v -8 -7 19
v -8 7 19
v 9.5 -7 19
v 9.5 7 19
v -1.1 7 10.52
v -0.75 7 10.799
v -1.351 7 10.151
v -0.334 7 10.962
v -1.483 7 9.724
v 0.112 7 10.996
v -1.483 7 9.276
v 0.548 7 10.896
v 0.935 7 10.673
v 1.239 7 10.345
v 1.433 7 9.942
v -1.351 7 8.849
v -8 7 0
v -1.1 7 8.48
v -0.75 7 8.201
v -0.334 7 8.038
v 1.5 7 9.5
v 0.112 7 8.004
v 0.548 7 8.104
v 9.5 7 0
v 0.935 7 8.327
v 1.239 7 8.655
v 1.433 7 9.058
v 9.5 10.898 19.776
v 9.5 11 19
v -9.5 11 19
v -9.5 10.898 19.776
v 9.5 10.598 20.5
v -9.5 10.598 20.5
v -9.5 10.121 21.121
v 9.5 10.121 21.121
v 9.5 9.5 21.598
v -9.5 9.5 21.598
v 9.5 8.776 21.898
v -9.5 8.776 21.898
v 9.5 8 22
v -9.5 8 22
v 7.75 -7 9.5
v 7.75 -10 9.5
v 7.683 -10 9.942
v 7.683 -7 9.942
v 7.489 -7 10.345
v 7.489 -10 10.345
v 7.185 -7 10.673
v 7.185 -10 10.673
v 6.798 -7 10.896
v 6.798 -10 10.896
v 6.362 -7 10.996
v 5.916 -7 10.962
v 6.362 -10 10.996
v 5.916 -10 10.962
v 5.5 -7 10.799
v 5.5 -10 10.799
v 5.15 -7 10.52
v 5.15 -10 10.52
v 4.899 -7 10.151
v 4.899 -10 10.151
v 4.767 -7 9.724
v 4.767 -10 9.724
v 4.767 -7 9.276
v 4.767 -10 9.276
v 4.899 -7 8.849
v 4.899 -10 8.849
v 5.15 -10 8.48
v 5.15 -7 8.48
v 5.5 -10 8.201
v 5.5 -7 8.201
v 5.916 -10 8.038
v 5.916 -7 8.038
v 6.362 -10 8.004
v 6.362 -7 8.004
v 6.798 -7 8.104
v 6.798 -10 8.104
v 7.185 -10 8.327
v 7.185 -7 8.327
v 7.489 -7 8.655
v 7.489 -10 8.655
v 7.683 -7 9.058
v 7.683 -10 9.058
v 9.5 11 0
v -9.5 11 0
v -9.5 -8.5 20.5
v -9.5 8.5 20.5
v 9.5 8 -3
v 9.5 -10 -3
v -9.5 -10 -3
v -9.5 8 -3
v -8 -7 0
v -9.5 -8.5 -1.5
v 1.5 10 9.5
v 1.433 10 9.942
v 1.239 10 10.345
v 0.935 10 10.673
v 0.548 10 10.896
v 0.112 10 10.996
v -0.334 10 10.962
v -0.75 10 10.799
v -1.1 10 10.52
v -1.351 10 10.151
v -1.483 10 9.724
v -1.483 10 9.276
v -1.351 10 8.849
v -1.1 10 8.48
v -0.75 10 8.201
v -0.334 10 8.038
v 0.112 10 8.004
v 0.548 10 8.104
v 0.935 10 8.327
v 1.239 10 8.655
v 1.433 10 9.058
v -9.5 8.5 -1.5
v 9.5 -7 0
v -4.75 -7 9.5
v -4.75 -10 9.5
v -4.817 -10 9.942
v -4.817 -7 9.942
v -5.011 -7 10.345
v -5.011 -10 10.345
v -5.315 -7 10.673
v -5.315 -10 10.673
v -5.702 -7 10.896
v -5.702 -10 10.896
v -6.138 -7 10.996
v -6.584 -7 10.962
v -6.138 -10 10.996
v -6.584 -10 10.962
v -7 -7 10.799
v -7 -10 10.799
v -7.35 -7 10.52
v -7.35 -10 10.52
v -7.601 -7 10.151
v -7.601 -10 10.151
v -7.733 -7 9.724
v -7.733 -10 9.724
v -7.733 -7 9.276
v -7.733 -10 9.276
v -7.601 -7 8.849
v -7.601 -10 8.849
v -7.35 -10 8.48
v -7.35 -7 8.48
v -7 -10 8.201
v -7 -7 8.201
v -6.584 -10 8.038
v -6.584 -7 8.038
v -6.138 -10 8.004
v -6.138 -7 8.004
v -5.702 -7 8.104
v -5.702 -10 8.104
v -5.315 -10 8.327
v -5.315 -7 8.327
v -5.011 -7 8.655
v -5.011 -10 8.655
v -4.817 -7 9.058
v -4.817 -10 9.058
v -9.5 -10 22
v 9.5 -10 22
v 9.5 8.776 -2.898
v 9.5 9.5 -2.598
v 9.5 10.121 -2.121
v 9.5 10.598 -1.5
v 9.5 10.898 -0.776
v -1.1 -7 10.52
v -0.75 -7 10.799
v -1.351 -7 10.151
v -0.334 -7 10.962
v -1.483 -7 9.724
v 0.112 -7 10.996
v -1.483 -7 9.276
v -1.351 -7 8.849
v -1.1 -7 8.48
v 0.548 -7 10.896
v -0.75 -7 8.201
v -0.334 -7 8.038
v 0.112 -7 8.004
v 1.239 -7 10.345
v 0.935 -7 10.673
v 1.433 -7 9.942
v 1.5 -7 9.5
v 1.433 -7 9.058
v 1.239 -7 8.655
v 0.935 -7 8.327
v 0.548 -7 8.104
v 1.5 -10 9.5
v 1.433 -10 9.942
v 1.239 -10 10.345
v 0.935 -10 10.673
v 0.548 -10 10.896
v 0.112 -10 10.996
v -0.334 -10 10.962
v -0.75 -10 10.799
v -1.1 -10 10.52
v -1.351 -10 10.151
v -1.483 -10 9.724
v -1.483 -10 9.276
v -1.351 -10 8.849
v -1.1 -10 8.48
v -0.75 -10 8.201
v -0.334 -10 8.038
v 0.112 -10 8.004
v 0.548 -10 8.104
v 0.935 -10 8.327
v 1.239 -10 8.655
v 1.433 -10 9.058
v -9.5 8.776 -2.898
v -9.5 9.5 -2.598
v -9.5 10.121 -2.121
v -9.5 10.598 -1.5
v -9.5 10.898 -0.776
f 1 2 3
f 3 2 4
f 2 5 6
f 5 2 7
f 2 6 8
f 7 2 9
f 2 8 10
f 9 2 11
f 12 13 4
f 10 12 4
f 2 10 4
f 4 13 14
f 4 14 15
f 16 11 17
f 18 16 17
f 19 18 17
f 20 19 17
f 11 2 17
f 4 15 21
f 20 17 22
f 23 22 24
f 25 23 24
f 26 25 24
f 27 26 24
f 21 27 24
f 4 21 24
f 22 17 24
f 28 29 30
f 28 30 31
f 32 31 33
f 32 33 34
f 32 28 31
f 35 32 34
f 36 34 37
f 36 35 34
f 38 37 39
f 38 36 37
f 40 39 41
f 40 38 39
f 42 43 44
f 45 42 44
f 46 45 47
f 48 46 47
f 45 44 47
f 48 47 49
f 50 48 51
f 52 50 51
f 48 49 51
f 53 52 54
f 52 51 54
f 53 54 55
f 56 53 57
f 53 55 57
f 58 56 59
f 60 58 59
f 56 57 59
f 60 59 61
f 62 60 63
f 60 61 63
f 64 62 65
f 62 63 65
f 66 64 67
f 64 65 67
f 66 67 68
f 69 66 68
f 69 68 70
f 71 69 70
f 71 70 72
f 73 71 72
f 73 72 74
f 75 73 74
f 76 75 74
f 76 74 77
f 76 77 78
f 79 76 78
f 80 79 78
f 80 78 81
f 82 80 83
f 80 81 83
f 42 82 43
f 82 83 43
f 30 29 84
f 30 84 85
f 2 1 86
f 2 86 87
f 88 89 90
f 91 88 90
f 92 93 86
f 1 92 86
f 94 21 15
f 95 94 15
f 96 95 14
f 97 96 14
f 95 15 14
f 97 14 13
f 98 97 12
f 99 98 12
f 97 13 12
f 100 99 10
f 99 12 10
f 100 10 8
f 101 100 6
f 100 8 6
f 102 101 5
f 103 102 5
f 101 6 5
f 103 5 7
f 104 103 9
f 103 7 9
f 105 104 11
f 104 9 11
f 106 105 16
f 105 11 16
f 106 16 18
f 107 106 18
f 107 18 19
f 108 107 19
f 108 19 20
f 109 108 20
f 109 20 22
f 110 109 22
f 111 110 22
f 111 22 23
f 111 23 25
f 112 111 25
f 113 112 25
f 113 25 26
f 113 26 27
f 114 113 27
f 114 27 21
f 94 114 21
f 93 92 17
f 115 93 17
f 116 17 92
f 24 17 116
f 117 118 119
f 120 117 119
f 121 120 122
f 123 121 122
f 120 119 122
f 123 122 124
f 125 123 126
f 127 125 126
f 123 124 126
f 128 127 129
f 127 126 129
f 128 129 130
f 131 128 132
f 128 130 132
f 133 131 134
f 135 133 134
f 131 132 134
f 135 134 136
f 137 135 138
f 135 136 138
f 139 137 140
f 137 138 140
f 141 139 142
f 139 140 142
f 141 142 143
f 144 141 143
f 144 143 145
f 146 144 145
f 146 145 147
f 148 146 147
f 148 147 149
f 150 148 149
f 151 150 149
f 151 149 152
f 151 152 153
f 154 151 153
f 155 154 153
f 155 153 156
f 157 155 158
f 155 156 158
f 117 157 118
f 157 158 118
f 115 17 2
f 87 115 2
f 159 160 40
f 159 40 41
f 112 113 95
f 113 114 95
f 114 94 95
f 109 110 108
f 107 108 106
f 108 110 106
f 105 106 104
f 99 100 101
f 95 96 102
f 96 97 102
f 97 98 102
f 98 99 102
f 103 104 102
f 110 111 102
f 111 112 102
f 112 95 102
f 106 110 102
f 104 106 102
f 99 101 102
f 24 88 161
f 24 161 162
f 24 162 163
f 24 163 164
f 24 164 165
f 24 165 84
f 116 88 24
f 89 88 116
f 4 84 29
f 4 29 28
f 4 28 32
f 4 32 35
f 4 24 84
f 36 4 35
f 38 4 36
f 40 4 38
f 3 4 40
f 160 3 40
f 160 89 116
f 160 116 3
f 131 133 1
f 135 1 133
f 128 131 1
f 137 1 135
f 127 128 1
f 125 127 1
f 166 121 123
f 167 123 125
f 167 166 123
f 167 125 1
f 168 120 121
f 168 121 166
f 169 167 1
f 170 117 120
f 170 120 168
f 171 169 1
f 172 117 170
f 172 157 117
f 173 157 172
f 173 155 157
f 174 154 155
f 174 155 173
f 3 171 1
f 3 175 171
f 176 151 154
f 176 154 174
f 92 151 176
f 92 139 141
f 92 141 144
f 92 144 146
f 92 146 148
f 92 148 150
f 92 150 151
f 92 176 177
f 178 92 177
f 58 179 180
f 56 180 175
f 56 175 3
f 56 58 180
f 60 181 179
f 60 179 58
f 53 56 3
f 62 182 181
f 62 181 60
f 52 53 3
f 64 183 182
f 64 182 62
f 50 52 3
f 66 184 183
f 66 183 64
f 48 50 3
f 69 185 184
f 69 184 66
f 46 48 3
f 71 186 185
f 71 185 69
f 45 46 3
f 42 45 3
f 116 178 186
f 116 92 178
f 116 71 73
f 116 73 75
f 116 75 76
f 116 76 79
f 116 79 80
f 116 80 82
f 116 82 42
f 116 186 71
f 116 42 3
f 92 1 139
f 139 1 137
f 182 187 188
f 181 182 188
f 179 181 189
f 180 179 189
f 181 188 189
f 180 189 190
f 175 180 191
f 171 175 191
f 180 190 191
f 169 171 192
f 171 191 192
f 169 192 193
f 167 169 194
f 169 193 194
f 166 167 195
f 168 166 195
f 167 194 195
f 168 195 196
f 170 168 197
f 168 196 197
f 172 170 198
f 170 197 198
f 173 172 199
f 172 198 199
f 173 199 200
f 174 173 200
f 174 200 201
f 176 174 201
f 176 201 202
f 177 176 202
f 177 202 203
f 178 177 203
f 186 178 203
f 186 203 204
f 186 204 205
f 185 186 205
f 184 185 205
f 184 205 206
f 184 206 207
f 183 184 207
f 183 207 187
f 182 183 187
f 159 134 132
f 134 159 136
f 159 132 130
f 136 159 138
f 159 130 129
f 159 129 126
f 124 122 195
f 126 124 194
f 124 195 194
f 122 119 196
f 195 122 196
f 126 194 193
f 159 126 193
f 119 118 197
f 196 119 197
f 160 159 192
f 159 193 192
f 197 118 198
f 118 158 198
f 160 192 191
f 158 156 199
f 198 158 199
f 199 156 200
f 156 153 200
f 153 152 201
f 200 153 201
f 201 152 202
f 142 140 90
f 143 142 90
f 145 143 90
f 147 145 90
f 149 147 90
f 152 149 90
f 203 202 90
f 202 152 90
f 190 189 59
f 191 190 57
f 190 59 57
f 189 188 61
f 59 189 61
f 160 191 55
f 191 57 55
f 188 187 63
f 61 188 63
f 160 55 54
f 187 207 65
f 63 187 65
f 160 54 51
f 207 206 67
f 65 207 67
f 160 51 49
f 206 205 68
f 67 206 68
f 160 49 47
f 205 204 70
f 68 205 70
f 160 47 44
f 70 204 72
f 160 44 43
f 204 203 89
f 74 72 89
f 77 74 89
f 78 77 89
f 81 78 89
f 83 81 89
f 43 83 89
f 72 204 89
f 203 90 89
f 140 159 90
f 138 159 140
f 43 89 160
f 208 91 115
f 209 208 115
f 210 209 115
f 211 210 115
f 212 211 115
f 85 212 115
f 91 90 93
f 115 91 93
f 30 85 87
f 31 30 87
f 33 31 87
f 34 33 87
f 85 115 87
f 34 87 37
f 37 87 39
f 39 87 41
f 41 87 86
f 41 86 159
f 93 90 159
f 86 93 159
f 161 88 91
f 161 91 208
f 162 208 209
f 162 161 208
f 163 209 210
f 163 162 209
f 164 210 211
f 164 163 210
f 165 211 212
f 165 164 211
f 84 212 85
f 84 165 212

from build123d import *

# Parameters (mm, degrees)
SKETCH_W        = 19
SKETCH_H        = 14
PAD_DEPTH       = 19
THICKNESS_T     = 3
SKETCH001_R     = 1.5
POCKET_DEPTH    = 20
SKETCH002_R     = 1.5
POCKET001_DEPTH = 3
CHAMFER_SIZE    = 1.5
SKETCH003_W     = 19
SKETCH003_H     = 25
PAD001_DEPTH    = 1
POCKET002_DEPTH = 24


with BuildPart() as part:
    # Sketch → Pad (new body)
    with BuildSketch(Plane.XY):
        Rectangle(SKETCH_W, SKETCH_H)
    extrude(amount=PAD_DEPTH)

    # Thickness
    thickness_openings = [part.faces().sort_by_distance(p)[0] for p in [
        (-9.5, 0, 9.5),
        (9.5, 0, 9.5),
    ]]
    offset(amount=THICKNESS_T, openings=thickness_openings, kind=Kind.INTERSECTION)

    # Sketch001 (on Face8 of Thickness) → Pocket (cut)
    with BuildSketch(Plane.XZ.offset(10)):
        with Locations((0, 9.5)):
            Circle(SKETCH001_R)
    extrude(amount=-POCKET_DEPTH, mode=Mode.SUBTRACT)

    # Sketch002 (on Face10 of Pocket) → Pocket001 (cut)
    with BuildSketch(Plane.XZ.offset(10)):
        with Locations((-6.25, 9.5)):
            Circle(SKETCH002_R)
        with Locations((6.25, 9.5)):
            Circle(SKETCH002_R)
    extrude(amount=-POCKET001_DEPTH, mode=Mode.SUBTRACT)

    # Chamfer
    chamfer_edges = [part.edges().sort_by_distance(p)[0] for p in [
        (-9.5, 0, 0),
        (-9.5, 0, 19),
        (-9.5, 7, 9.5),
        (-9.5, -7, 9.5),
    ]]
    chamfer(chamfer_edges, length=CHAMFER_SIZE)

    # Sketch003 (on Face13 of Chamfer) → Pad001 (join)
    with BuildSketch(Plane(origin=(0, 10, 0), x_dir=(-1, 0, 0), z_dir=(0, 1, 0))):
        with Locations((0, 9.5)):
            Rectangle(SKETCH003_W, SKETCH003_H)
    extrude(amount=PAD001_DEPTH)

    # Sketch004 (on Face4 of Pad001) → Pocket002 (cut)
    with BuildSketch(Plane.YZ.offset(9.5)):
        with BuildLine():
            ThreePointArc((11, 19), (10.12132, 21.12132), (8, 22))
            Line((8, 22), (11, 22))
            Line((11, 22), (11, 19))
        make_face()
        with BuildLine():
            ThreePointArc((8, -3), (10.12132, -2.12132), (11, 0))
            Line((11, 0), (11, -3))
            Line((8, -3), (11, -3))
        make_face()
    extrude(amount=-POCKET002_DEPTH, mode=Mode.SUBTRACT)


solid = part.part
